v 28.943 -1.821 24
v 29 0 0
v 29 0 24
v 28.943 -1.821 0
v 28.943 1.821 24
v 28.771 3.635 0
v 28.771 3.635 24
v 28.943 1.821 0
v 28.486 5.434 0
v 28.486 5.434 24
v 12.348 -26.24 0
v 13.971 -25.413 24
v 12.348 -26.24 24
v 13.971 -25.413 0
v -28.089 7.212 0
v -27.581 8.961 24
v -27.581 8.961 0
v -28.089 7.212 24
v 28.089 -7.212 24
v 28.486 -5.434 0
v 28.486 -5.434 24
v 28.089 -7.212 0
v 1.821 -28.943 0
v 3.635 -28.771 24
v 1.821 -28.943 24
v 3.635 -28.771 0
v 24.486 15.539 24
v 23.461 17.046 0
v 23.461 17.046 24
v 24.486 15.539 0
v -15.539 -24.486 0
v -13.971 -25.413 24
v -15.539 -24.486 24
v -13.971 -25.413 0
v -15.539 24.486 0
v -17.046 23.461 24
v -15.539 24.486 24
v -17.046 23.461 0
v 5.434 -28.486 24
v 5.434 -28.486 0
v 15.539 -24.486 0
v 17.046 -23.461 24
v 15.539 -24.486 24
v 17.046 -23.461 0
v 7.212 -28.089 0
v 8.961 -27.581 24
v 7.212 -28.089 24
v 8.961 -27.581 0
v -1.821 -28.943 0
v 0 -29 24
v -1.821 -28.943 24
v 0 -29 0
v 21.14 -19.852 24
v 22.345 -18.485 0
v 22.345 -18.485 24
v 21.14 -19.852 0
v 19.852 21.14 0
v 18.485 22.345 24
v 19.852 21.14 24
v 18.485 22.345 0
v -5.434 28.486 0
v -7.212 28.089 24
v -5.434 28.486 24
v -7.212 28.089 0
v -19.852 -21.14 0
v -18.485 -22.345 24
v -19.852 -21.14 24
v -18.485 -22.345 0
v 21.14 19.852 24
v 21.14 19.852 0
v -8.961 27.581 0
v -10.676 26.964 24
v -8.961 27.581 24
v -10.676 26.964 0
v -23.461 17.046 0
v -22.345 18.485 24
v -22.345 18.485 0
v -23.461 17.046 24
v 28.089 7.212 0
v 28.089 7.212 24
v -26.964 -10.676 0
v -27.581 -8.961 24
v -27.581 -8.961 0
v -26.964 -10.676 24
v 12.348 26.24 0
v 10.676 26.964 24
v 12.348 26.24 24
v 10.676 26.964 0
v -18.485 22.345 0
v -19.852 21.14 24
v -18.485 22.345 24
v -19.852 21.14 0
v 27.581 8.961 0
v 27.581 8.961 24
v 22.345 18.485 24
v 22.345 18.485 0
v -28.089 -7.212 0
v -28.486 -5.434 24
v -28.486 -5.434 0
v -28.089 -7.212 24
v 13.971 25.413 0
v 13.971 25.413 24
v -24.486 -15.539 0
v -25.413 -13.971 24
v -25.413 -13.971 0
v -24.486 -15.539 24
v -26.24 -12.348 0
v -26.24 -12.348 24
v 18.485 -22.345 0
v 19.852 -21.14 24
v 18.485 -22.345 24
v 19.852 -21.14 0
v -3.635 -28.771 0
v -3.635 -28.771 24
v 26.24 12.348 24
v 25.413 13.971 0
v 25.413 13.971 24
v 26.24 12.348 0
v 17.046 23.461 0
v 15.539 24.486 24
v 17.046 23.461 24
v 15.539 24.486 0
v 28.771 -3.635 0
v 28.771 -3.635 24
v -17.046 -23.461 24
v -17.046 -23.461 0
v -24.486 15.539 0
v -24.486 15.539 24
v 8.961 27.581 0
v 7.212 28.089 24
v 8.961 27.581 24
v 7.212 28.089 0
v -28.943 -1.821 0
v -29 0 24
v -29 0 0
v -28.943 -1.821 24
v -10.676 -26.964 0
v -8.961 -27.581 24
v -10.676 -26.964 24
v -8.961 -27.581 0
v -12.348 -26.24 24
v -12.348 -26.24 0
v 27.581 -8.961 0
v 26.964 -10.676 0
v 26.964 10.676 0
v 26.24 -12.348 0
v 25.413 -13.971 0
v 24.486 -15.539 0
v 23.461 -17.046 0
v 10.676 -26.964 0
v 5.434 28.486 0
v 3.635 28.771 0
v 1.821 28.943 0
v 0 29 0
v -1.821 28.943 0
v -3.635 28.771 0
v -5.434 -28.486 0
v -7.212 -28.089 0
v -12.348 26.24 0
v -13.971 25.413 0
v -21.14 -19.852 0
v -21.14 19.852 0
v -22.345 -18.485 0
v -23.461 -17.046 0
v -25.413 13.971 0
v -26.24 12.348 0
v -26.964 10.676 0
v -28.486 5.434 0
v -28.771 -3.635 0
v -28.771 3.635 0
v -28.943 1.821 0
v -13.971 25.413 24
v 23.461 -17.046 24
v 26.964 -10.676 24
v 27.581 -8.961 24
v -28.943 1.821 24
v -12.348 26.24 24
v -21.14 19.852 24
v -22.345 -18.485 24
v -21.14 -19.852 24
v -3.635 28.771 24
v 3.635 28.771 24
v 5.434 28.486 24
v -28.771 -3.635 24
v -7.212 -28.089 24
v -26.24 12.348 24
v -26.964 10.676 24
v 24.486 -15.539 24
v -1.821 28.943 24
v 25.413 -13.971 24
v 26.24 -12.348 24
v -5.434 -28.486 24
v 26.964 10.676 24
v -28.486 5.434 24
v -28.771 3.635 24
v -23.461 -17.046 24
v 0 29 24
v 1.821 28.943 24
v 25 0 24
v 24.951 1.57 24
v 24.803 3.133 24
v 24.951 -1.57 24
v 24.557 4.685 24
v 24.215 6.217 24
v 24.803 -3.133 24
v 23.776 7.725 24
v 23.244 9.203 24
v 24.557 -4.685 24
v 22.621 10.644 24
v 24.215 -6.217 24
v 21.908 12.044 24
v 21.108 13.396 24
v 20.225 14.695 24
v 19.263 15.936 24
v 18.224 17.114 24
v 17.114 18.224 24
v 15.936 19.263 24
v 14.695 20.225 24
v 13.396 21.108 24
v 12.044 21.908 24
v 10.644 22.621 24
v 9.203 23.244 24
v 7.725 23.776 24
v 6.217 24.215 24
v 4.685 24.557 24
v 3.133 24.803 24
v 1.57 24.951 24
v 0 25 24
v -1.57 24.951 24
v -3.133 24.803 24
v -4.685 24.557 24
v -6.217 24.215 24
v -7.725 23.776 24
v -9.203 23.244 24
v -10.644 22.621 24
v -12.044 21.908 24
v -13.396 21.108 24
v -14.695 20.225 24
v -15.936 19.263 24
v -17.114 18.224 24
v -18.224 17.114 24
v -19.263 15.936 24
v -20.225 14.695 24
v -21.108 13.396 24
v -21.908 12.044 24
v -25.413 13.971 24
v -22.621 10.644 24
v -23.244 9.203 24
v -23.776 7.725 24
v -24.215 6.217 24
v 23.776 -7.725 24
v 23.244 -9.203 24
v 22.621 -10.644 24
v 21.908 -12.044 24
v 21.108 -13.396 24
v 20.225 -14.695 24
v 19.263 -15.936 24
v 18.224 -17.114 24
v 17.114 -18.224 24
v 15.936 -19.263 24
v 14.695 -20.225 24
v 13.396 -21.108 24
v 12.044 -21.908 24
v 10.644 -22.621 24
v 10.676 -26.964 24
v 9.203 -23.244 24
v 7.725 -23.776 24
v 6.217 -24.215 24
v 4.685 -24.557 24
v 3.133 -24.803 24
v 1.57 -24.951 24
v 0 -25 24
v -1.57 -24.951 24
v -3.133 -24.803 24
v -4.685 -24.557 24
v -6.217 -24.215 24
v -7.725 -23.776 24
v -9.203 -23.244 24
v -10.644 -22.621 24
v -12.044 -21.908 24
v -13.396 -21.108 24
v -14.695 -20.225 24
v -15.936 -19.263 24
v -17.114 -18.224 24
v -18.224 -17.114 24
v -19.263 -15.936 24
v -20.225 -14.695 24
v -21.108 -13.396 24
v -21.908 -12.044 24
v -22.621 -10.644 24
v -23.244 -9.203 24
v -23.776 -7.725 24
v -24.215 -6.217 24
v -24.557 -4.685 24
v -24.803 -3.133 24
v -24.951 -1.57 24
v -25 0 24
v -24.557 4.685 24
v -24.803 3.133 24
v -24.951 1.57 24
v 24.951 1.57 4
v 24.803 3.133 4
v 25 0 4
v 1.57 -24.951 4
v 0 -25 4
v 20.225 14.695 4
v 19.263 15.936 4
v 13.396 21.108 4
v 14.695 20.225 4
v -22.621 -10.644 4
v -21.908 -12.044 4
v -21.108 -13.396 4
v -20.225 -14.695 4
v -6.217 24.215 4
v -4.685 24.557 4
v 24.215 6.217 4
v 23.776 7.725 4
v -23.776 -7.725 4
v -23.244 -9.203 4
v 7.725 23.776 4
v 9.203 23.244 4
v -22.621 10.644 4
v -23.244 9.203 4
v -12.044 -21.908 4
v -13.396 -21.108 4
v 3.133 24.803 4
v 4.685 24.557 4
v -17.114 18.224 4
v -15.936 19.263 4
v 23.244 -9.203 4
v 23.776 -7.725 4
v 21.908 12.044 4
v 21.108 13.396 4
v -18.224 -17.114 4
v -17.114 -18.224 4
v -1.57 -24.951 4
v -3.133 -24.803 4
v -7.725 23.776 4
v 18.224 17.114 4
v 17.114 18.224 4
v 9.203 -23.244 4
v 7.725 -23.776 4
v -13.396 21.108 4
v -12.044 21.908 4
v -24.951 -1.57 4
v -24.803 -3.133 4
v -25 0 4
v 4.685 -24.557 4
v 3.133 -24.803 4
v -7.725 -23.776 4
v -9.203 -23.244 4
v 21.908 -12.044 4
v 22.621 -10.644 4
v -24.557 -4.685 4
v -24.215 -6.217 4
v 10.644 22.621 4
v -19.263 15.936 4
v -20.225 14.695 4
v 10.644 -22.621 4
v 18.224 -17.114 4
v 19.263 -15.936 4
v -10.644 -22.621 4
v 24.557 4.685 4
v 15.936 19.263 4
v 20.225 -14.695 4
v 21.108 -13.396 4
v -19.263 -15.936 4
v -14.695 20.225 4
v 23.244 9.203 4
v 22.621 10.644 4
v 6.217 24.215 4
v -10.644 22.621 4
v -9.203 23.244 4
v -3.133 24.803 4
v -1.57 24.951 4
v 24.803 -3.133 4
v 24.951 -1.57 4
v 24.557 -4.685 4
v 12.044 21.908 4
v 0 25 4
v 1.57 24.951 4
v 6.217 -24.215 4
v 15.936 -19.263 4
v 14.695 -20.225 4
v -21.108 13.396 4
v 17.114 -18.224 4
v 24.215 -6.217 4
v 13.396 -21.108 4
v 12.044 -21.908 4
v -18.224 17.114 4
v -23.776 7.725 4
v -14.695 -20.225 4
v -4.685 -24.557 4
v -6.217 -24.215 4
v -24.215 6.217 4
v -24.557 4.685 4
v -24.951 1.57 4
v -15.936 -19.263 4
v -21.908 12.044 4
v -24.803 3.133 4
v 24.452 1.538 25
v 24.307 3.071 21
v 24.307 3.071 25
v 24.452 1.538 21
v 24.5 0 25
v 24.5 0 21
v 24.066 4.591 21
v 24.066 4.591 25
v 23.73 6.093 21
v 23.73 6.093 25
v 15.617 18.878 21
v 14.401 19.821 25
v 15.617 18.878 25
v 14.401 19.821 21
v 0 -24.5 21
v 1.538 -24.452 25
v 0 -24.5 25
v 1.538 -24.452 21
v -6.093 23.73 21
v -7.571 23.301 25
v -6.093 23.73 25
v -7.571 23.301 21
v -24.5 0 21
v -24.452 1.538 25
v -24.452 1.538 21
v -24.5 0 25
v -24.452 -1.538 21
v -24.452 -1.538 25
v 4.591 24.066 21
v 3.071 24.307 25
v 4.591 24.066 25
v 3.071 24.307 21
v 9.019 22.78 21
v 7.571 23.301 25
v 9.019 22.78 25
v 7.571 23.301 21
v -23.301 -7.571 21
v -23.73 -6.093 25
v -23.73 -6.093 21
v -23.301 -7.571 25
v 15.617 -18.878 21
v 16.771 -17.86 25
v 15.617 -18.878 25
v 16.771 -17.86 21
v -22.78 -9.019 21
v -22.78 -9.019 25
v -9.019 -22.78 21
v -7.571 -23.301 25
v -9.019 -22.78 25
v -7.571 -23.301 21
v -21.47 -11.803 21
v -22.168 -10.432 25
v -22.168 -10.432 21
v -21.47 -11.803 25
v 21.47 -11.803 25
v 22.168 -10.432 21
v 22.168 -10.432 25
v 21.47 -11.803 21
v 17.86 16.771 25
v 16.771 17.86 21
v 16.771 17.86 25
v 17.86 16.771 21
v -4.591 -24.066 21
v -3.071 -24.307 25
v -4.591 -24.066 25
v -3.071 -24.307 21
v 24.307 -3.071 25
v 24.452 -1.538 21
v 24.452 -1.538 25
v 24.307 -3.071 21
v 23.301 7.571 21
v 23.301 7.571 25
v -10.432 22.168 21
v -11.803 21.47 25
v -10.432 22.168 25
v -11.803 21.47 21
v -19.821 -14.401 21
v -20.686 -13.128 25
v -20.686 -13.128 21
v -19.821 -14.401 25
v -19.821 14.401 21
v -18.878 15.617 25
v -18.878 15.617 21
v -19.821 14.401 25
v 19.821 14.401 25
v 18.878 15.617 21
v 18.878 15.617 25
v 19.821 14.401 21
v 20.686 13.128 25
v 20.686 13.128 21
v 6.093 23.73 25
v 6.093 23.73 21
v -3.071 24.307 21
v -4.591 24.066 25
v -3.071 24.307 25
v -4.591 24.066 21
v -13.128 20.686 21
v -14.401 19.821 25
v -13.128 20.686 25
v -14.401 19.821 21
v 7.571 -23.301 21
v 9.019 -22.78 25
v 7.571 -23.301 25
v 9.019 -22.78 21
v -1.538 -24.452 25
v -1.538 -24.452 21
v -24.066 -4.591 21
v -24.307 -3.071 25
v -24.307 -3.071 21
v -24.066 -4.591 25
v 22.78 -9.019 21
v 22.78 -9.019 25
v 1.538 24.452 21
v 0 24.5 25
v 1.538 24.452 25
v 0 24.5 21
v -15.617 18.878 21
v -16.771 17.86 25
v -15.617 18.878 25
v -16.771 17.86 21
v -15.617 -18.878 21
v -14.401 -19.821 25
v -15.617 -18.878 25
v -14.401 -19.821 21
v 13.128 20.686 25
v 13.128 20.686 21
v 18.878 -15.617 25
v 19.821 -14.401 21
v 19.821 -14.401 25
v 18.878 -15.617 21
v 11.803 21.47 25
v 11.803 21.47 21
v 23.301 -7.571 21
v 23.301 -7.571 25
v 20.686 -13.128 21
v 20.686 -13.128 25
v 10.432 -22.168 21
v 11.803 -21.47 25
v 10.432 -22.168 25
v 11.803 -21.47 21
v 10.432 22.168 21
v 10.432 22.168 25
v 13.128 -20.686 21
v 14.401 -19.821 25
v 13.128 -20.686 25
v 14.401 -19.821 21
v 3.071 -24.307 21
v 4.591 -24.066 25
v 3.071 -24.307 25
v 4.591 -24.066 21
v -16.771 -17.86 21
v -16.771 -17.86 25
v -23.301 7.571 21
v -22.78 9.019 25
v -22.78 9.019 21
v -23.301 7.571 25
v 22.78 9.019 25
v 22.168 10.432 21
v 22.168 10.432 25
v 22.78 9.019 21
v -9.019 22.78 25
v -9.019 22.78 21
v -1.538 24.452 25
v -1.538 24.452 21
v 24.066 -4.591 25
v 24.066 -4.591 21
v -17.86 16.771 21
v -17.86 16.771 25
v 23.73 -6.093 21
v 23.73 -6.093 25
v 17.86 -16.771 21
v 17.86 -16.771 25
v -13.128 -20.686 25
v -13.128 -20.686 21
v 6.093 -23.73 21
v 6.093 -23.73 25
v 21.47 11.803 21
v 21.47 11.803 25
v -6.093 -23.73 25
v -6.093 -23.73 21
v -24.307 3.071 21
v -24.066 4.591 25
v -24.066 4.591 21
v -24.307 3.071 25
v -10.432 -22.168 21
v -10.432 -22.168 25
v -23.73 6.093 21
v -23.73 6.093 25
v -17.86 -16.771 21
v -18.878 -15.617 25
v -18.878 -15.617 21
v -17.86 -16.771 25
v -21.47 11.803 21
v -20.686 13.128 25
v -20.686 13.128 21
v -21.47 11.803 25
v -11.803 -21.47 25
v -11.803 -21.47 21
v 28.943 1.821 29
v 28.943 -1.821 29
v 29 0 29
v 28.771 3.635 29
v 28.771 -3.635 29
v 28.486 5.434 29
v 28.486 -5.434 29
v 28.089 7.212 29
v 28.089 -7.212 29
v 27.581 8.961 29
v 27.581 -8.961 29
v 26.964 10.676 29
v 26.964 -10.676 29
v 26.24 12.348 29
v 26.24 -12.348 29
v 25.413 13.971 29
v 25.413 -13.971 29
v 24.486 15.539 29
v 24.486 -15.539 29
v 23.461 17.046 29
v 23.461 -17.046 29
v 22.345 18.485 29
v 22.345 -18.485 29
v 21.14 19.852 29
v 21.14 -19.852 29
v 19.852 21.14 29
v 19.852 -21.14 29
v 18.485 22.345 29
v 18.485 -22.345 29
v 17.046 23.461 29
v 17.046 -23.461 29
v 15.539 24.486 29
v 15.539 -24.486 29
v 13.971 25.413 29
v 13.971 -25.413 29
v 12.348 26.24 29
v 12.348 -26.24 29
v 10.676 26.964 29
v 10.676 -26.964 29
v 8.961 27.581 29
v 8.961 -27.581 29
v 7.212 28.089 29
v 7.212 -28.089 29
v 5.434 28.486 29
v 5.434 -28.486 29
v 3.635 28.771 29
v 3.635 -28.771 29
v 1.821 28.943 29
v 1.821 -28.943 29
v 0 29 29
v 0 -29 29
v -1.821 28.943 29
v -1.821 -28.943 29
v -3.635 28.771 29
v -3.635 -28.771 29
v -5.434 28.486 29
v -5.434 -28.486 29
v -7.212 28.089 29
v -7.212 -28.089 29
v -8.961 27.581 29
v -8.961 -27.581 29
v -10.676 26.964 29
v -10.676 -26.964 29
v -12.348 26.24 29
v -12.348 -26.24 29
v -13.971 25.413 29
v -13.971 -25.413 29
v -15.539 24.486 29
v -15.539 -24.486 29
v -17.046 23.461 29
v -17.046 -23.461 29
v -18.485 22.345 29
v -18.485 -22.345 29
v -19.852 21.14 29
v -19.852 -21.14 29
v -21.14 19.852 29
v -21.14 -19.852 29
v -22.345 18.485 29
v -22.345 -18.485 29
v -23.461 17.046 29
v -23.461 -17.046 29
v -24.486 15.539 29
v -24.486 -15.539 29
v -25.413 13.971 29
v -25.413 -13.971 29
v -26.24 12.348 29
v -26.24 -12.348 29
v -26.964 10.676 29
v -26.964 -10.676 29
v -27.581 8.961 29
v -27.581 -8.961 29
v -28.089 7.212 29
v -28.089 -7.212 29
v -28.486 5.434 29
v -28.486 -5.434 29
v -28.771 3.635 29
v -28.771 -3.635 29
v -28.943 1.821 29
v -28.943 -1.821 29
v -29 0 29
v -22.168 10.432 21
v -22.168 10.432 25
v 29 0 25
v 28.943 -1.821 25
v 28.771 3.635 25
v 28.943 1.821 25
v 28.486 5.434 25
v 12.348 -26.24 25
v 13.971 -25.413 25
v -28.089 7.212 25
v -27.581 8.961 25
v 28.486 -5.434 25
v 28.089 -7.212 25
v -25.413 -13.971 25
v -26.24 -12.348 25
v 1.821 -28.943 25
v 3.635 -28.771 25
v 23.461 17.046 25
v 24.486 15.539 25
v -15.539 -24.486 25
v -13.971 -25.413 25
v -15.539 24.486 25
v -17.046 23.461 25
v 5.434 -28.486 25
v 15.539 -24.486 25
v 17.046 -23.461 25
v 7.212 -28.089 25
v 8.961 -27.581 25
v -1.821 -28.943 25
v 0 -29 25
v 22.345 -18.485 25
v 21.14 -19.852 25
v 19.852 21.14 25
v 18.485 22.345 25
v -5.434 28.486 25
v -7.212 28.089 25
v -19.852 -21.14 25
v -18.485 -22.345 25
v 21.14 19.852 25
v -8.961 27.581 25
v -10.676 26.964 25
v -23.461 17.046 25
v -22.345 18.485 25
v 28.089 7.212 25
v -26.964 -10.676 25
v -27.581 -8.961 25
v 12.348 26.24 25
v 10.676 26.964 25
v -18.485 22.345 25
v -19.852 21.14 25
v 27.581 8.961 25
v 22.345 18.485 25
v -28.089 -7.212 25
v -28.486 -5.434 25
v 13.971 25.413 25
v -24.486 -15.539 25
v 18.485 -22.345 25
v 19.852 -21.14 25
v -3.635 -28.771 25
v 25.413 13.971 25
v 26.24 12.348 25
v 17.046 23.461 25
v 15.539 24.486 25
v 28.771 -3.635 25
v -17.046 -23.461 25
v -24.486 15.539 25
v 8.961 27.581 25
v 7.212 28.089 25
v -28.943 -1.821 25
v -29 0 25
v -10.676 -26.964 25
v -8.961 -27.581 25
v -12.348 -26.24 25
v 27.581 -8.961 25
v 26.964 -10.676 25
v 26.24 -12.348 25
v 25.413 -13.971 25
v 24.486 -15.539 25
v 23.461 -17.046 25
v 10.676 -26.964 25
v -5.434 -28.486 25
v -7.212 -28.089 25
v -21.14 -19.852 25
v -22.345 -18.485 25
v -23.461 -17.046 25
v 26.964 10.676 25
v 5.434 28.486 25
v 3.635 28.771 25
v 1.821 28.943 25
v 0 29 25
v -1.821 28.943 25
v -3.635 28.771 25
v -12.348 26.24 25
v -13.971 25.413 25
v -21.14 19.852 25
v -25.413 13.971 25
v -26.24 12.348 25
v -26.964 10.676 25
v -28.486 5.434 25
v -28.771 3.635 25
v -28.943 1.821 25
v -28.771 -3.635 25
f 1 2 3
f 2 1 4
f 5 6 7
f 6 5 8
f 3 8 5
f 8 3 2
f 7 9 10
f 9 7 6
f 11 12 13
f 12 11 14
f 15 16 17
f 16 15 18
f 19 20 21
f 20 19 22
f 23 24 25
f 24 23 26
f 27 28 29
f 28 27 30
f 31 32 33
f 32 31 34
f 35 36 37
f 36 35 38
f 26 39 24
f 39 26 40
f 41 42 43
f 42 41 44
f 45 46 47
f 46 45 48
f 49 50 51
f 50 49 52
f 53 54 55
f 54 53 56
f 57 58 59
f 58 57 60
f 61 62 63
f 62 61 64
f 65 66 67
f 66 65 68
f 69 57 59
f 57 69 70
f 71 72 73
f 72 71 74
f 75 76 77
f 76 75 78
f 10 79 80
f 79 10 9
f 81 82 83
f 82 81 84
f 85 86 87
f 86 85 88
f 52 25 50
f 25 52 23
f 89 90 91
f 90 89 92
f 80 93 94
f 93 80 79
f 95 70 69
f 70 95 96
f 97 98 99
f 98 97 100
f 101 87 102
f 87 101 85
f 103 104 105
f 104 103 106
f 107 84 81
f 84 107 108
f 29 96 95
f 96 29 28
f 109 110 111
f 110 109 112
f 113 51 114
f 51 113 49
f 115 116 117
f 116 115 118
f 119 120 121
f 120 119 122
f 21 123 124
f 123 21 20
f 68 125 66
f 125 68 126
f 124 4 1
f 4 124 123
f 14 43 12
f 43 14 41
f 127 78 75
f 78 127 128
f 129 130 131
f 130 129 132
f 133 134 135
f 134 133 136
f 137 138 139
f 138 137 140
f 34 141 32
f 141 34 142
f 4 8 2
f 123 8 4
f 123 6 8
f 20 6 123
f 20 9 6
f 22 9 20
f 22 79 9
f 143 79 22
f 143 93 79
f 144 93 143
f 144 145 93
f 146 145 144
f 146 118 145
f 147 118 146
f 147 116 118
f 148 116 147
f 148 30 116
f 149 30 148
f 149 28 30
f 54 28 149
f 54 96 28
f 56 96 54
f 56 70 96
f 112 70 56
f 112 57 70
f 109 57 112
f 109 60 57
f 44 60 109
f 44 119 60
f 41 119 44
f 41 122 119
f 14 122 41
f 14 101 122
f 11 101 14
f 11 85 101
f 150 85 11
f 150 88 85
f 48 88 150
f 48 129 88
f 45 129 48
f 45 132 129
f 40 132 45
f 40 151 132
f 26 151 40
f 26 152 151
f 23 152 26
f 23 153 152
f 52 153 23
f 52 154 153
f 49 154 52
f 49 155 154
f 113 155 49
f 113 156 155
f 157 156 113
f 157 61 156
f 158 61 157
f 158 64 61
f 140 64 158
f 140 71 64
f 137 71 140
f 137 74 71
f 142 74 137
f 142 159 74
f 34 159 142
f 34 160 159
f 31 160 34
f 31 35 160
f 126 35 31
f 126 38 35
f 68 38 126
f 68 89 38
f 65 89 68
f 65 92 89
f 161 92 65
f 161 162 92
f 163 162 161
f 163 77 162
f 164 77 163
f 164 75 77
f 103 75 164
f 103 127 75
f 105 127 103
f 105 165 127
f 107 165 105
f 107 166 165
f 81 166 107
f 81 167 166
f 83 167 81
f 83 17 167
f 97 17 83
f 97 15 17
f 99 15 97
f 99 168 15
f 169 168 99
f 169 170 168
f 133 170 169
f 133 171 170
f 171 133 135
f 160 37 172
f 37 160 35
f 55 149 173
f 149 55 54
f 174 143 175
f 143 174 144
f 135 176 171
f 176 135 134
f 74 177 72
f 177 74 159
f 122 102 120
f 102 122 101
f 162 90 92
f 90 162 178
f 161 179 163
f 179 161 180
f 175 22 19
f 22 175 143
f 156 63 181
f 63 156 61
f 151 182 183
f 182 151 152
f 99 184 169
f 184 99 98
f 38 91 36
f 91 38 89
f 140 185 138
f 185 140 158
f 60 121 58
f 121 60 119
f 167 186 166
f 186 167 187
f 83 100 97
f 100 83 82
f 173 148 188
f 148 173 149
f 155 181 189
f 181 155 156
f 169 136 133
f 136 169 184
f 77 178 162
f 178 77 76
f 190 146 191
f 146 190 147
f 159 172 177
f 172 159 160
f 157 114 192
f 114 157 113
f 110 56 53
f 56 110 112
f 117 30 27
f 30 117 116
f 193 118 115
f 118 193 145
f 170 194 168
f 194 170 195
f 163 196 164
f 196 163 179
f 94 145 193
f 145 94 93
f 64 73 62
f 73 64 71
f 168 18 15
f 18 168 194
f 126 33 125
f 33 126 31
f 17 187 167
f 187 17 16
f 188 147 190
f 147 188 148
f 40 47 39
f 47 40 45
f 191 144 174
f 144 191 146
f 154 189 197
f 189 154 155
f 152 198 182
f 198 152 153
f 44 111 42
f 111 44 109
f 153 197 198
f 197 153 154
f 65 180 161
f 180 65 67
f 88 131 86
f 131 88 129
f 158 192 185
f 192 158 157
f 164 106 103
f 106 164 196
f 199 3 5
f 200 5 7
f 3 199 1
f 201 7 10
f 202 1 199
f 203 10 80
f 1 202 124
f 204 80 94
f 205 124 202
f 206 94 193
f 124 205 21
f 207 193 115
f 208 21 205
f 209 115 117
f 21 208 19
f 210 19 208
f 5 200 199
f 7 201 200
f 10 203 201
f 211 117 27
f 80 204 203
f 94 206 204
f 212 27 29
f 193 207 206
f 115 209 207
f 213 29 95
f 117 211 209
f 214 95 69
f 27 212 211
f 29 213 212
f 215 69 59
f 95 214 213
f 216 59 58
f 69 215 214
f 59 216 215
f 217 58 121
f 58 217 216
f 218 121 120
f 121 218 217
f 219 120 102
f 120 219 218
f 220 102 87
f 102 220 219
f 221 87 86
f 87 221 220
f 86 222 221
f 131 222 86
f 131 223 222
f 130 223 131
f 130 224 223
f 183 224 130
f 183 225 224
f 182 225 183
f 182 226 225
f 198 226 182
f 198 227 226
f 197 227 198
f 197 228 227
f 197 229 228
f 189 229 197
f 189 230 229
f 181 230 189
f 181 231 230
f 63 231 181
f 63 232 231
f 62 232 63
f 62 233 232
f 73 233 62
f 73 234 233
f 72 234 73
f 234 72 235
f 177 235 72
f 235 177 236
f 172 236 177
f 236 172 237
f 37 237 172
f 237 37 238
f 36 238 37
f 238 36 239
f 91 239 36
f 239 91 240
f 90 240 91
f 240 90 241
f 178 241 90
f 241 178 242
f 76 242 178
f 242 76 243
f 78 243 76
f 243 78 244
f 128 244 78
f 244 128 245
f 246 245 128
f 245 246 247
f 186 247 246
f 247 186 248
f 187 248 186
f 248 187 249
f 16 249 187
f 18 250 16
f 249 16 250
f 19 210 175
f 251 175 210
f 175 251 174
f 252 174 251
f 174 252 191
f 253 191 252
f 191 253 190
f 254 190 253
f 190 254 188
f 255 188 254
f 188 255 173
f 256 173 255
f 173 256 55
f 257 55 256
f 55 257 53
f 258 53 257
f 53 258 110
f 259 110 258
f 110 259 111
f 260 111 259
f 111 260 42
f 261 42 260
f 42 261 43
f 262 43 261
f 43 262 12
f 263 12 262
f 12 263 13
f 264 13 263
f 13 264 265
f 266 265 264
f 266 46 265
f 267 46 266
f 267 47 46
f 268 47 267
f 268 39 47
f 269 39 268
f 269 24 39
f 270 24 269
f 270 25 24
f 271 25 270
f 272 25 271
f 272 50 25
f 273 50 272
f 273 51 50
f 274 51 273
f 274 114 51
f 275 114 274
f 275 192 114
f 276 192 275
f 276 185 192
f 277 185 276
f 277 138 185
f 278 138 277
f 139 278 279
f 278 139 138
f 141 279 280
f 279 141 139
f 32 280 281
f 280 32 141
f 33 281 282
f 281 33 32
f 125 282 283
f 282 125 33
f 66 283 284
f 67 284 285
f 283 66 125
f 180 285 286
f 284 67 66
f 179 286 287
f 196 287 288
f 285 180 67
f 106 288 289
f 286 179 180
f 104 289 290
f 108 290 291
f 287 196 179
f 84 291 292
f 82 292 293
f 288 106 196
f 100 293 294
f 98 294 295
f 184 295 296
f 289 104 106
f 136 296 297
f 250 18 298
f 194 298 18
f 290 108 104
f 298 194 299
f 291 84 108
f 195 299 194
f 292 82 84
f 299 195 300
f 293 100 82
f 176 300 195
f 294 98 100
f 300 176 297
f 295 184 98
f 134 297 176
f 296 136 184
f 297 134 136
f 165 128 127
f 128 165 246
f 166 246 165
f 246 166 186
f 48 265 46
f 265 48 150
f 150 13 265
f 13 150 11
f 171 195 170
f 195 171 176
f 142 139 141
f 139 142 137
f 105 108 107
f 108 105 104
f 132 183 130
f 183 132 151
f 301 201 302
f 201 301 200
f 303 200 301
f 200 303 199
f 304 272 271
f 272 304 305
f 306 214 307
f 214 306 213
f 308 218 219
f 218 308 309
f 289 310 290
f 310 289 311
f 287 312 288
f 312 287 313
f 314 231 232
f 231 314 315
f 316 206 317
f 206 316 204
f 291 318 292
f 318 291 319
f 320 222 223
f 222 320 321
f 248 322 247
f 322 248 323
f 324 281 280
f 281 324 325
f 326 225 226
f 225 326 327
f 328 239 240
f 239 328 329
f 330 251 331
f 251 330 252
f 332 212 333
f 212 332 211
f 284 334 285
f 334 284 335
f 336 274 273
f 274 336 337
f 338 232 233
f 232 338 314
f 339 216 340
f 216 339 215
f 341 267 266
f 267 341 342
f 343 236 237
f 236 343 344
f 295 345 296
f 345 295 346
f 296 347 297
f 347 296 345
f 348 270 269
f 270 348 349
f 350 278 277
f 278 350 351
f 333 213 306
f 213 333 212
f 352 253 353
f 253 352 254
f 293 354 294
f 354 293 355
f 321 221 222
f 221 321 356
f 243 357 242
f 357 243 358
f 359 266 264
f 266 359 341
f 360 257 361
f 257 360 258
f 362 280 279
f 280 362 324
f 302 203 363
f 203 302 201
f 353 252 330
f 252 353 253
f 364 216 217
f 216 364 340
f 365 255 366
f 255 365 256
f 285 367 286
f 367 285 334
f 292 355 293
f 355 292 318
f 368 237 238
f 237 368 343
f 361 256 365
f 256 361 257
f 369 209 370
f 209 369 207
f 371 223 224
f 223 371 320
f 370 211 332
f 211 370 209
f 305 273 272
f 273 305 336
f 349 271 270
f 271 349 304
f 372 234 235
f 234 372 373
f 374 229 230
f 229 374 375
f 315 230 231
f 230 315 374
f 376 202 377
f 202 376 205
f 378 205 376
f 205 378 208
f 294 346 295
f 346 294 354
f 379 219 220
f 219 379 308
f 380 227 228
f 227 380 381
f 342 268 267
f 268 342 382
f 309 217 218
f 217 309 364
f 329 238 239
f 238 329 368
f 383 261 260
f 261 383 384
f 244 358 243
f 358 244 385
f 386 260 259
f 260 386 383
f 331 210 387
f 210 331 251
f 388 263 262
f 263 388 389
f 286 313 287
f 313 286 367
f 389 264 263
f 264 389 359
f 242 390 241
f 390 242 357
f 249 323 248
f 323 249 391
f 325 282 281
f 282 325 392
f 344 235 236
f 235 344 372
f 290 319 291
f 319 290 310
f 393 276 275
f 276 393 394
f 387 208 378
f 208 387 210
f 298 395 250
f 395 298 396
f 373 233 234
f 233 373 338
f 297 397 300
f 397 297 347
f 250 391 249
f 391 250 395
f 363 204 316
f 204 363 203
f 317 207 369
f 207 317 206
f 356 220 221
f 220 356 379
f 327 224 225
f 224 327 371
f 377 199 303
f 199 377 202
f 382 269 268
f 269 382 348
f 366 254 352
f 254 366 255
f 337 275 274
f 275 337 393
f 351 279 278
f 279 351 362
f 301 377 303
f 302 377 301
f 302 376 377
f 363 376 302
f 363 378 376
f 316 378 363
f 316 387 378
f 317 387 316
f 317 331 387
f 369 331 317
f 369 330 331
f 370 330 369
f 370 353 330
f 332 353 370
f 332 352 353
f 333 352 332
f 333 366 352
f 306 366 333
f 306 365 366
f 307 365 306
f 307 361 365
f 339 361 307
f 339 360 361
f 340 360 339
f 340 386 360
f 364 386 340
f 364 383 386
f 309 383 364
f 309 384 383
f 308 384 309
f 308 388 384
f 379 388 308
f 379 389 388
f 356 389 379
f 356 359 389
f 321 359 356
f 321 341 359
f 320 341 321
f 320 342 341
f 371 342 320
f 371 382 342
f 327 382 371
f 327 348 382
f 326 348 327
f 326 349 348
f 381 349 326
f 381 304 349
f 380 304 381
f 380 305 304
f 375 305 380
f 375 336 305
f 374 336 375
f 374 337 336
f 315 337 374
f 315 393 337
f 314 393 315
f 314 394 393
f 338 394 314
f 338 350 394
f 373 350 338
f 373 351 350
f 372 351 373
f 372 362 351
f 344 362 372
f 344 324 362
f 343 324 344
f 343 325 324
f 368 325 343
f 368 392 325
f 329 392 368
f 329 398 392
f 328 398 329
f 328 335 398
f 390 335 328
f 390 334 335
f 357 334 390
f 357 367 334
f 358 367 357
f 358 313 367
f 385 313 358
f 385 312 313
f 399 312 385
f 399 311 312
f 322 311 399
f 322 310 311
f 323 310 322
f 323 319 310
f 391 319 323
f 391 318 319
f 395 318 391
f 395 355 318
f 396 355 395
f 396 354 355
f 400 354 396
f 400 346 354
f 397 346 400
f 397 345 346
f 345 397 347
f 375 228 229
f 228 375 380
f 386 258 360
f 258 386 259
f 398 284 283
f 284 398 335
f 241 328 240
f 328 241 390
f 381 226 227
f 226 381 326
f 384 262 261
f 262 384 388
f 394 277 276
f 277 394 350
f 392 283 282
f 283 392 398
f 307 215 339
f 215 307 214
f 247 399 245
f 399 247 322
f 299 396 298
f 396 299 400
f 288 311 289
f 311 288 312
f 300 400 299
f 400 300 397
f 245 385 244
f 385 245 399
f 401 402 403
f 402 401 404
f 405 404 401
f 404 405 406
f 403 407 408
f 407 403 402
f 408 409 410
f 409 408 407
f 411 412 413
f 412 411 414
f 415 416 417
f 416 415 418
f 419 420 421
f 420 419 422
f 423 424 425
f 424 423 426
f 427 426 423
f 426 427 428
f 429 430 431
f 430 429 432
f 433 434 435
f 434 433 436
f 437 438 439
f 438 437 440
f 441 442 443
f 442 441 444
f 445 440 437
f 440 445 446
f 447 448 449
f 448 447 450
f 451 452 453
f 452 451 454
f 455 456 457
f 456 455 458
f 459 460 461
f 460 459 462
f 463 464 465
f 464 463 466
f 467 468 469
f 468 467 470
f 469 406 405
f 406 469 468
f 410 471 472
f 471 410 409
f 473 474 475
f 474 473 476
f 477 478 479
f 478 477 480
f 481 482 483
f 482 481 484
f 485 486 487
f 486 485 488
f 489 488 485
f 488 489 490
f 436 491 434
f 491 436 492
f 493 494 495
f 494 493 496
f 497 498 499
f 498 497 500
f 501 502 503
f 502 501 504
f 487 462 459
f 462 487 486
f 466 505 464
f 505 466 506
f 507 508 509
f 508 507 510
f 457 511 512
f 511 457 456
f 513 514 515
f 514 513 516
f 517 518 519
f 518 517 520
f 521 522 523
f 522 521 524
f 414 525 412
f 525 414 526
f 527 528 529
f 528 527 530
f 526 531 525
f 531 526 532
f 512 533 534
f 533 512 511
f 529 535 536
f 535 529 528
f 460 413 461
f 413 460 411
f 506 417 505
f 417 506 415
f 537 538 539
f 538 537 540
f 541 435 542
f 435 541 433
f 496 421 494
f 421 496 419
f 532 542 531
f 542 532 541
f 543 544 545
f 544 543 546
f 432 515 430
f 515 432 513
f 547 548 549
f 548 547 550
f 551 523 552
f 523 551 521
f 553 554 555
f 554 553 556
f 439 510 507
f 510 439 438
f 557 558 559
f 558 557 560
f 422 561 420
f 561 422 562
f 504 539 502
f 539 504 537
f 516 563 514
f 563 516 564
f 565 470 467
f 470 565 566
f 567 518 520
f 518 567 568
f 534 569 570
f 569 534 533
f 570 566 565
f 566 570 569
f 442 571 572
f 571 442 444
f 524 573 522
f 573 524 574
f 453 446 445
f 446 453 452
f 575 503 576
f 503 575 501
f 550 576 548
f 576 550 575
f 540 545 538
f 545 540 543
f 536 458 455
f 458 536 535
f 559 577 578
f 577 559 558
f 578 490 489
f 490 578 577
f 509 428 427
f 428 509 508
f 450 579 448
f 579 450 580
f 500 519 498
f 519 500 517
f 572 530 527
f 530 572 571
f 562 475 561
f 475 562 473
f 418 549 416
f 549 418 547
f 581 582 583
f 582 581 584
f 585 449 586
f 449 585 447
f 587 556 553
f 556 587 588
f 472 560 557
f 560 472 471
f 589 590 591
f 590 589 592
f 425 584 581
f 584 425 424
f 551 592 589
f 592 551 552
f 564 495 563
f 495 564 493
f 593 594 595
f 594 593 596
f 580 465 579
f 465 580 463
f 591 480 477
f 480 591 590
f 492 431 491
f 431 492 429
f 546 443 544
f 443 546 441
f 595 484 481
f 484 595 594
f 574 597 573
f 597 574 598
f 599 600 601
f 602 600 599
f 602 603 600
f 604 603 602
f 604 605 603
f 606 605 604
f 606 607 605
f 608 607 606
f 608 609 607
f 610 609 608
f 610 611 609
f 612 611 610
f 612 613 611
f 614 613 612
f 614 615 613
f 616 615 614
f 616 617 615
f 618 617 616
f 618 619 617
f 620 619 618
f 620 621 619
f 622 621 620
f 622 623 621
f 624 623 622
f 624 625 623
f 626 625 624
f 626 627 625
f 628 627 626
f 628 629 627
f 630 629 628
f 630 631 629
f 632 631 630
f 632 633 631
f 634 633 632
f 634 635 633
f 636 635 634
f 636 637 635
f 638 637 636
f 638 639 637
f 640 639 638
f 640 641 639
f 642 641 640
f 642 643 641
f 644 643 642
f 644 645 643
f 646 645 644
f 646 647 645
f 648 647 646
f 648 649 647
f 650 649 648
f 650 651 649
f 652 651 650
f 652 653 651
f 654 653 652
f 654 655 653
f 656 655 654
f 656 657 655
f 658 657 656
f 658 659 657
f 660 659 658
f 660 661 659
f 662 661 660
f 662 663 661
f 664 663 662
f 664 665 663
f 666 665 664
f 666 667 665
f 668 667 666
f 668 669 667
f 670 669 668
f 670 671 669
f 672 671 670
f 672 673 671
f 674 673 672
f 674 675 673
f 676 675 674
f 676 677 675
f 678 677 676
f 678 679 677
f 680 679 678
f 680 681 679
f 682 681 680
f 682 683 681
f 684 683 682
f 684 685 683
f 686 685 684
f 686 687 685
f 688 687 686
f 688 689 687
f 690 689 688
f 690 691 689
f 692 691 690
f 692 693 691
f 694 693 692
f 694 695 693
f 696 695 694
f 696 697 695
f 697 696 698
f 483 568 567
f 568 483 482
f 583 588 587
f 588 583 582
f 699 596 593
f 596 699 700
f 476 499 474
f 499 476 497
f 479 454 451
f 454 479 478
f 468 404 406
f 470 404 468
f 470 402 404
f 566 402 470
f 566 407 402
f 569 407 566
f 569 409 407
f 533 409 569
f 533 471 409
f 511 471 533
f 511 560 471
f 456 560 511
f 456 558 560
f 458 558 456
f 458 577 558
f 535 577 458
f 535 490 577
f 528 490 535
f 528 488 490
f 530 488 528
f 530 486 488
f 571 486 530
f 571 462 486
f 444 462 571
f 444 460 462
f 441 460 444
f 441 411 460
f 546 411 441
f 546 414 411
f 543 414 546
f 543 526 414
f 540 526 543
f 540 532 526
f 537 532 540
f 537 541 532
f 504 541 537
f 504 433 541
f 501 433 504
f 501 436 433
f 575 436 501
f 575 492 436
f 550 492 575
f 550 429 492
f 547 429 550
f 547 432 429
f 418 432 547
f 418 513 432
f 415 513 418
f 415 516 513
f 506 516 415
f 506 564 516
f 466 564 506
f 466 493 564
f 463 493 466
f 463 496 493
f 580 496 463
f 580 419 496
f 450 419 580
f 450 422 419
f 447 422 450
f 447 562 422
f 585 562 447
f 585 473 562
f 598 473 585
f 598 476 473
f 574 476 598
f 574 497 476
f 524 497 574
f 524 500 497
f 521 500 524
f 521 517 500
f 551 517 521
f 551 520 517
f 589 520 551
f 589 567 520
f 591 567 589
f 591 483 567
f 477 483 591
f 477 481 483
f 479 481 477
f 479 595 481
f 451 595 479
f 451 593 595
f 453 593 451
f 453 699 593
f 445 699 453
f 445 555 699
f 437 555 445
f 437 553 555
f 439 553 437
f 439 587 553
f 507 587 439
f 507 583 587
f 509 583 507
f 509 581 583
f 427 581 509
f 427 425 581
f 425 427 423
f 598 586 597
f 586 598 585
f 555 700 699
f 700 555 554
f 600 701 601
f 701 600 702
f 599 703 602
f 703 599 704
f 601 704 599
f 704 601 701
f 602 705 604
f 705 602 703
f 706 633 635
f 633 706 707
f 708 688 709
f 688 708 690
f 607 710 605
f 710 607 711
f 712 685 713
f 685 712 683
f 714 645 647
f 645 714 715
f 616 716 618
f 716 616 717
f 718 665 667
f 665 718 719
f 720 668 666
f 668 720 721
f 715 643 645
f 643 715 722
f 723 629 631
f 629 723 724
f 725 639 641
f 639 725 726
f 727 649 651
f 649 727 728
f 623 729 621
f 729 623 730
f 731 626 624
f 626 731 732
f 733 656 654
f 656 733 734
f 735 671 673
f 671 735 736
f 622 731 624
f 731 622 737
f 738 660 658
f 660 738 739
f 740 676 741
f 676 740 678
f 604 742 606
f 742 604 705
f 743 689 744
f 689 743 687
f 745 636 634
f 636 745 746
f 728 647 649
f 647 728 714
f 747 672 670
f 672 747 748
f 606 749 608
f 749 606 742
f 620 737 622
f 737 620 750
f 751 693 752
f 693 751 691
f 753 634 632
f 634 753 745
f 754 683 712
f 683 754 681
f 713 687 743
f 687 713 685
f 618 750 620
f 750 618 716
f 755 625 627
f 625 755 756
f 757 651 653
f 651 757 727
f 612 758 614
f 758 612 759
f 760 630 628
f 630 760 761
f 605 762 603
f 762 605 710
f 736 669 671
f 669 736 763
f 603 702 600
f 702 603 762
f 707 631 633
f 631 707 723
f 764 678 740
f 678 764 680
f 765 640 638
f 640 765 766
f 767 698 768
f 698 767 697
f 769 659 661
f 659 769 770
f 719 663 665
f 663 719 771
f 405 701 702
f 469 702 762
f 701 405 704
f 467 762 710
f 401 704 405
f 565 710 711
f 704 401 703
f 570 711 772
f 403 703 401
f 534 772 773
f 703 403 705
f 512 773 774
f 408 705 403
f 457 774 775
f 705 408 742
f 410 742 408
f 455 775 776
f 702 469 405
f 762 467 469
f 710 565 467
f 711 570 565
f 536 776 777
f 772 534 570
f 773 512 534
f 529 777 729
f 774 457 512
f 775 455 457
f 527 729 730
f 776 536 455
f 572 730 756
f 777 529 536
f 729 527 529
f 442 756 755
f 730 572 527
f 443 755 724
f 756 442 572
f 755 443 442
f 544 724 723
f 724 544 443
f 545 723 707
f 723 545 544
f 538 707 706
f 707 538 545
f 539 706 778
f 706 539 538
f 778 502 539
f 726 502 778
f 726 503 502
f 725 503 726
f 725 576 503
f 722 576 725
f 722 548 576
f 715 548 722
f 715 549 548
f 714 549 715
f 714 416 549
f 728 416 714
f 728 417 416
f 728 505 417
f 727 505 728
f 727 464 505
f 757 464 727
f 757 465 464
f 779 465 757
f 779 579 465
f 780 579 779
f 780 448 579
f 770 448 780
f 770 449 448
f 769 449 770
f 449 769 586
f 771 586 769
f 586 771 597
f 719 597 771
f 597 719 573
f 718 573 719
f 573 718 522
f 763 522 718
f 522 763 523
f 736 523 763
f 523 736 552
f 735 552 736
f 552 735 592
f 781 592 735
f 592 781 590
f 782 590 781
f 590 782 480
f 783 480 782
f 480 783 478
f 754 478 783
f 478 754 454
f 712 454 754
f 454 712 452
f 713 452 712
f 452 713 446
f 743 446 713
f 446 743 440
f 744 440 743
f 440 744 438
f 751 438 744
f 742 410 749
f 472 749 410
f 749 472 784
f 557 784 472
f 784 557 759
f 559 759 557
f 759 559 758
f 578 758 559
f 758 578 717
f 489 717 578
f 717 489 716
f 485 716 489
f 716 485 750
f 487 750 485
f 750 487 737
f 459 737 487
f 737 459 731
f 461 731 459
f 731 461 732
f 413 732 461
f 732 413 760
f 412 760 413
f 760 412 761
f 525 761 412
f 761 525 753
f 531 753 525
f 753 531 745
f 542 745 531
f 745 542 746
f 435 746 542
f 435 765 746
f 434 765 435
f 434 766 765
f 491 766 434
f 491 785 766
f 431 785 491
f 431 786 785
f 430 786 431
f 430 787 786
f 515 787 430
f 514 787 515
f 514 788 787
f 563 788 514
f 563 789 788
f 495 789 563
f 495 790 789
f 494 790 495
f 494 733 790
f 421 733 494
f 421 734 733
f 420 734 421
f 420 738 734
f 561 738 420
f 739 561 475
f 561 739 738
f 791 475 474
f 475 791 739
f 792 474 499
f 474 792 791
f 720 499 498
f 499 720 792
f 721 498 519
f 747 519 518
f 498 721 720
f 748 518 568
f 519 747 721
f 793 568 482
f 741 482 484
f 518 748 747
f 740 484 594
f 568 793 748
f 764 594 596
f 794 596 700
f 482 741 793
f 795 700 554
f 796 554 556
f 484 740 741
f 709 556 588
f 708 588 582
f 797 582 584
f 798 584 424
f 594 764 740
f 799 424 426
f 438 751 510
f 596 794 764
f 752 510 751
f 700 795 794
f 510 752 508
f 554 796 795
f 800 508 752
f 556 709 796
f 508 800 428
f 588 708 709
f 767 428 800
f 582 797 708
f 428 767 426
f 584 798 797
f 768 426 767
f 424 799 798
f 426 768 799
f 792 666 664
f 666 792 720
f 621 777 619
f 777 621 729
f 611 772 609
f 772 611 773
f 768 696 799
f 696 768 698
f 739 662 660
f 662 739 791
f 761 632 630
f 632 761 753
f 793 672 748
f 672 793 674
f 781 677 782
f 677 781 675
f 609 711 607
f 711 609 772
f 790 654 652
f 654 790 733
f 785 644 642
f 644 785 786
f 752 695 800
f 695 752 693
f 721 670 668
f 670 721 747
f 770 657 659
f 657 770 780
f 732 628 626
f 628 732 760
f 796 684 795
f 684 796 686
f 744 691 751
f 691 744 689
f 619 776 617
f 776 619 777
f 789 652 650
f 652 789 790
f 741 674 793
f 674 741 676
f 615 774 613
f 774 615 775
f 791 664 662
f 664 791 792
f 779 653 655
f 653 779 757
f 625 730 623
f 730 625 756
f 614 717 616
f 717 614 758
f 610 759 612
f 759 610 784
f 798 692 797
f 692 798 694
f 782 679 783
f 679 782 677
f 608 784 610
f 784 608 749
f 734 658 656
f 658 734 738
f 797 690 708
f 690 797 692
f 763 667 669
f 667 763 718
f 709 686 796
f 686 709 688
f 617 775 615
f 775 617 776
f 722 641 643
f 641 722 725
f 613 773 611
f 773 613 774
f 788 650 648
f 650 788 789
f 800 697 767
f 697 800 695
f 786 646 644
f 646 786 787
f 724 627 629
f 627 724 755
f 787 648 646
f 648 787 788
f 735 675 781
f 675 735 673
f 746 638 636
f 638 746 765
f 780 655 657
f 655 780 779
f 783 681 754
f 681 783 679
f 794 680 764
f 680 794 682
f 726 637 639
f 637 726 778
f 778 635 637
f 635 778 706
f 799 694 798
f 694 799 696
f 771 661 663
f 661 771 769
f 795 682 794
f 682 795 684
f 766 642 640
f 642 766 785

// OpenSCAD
$fn = 100;

boxdepth = 20;
boxdiam = 50;
wall = 4;

module box(x){
    scale([x,x,x]){
        difference(){
            cylinder(d=(boxdiam+(wall*2)),h=(boxdepth+wall));
            translate([0,0,wall]){
                cylinder(d=boxdiam,h=boxdepth);
            }
        }
    }
}
box(1);




module lid(x){
    scale([x,x,x]){
        translate([0,0,boxdepth+wall+1]){
            cylinder(d=(boxdiam+(wall*2)),h=wall);}
        
        difference(){ 
            translate([0,0,boxdepth+1]){
            cylinder(d=(boxdiam-1),h=(wall*2));
            cylinder(d=(boxdiam-wall-1),h=(wall*2));}
        }
    }
}
lid(1);
            
